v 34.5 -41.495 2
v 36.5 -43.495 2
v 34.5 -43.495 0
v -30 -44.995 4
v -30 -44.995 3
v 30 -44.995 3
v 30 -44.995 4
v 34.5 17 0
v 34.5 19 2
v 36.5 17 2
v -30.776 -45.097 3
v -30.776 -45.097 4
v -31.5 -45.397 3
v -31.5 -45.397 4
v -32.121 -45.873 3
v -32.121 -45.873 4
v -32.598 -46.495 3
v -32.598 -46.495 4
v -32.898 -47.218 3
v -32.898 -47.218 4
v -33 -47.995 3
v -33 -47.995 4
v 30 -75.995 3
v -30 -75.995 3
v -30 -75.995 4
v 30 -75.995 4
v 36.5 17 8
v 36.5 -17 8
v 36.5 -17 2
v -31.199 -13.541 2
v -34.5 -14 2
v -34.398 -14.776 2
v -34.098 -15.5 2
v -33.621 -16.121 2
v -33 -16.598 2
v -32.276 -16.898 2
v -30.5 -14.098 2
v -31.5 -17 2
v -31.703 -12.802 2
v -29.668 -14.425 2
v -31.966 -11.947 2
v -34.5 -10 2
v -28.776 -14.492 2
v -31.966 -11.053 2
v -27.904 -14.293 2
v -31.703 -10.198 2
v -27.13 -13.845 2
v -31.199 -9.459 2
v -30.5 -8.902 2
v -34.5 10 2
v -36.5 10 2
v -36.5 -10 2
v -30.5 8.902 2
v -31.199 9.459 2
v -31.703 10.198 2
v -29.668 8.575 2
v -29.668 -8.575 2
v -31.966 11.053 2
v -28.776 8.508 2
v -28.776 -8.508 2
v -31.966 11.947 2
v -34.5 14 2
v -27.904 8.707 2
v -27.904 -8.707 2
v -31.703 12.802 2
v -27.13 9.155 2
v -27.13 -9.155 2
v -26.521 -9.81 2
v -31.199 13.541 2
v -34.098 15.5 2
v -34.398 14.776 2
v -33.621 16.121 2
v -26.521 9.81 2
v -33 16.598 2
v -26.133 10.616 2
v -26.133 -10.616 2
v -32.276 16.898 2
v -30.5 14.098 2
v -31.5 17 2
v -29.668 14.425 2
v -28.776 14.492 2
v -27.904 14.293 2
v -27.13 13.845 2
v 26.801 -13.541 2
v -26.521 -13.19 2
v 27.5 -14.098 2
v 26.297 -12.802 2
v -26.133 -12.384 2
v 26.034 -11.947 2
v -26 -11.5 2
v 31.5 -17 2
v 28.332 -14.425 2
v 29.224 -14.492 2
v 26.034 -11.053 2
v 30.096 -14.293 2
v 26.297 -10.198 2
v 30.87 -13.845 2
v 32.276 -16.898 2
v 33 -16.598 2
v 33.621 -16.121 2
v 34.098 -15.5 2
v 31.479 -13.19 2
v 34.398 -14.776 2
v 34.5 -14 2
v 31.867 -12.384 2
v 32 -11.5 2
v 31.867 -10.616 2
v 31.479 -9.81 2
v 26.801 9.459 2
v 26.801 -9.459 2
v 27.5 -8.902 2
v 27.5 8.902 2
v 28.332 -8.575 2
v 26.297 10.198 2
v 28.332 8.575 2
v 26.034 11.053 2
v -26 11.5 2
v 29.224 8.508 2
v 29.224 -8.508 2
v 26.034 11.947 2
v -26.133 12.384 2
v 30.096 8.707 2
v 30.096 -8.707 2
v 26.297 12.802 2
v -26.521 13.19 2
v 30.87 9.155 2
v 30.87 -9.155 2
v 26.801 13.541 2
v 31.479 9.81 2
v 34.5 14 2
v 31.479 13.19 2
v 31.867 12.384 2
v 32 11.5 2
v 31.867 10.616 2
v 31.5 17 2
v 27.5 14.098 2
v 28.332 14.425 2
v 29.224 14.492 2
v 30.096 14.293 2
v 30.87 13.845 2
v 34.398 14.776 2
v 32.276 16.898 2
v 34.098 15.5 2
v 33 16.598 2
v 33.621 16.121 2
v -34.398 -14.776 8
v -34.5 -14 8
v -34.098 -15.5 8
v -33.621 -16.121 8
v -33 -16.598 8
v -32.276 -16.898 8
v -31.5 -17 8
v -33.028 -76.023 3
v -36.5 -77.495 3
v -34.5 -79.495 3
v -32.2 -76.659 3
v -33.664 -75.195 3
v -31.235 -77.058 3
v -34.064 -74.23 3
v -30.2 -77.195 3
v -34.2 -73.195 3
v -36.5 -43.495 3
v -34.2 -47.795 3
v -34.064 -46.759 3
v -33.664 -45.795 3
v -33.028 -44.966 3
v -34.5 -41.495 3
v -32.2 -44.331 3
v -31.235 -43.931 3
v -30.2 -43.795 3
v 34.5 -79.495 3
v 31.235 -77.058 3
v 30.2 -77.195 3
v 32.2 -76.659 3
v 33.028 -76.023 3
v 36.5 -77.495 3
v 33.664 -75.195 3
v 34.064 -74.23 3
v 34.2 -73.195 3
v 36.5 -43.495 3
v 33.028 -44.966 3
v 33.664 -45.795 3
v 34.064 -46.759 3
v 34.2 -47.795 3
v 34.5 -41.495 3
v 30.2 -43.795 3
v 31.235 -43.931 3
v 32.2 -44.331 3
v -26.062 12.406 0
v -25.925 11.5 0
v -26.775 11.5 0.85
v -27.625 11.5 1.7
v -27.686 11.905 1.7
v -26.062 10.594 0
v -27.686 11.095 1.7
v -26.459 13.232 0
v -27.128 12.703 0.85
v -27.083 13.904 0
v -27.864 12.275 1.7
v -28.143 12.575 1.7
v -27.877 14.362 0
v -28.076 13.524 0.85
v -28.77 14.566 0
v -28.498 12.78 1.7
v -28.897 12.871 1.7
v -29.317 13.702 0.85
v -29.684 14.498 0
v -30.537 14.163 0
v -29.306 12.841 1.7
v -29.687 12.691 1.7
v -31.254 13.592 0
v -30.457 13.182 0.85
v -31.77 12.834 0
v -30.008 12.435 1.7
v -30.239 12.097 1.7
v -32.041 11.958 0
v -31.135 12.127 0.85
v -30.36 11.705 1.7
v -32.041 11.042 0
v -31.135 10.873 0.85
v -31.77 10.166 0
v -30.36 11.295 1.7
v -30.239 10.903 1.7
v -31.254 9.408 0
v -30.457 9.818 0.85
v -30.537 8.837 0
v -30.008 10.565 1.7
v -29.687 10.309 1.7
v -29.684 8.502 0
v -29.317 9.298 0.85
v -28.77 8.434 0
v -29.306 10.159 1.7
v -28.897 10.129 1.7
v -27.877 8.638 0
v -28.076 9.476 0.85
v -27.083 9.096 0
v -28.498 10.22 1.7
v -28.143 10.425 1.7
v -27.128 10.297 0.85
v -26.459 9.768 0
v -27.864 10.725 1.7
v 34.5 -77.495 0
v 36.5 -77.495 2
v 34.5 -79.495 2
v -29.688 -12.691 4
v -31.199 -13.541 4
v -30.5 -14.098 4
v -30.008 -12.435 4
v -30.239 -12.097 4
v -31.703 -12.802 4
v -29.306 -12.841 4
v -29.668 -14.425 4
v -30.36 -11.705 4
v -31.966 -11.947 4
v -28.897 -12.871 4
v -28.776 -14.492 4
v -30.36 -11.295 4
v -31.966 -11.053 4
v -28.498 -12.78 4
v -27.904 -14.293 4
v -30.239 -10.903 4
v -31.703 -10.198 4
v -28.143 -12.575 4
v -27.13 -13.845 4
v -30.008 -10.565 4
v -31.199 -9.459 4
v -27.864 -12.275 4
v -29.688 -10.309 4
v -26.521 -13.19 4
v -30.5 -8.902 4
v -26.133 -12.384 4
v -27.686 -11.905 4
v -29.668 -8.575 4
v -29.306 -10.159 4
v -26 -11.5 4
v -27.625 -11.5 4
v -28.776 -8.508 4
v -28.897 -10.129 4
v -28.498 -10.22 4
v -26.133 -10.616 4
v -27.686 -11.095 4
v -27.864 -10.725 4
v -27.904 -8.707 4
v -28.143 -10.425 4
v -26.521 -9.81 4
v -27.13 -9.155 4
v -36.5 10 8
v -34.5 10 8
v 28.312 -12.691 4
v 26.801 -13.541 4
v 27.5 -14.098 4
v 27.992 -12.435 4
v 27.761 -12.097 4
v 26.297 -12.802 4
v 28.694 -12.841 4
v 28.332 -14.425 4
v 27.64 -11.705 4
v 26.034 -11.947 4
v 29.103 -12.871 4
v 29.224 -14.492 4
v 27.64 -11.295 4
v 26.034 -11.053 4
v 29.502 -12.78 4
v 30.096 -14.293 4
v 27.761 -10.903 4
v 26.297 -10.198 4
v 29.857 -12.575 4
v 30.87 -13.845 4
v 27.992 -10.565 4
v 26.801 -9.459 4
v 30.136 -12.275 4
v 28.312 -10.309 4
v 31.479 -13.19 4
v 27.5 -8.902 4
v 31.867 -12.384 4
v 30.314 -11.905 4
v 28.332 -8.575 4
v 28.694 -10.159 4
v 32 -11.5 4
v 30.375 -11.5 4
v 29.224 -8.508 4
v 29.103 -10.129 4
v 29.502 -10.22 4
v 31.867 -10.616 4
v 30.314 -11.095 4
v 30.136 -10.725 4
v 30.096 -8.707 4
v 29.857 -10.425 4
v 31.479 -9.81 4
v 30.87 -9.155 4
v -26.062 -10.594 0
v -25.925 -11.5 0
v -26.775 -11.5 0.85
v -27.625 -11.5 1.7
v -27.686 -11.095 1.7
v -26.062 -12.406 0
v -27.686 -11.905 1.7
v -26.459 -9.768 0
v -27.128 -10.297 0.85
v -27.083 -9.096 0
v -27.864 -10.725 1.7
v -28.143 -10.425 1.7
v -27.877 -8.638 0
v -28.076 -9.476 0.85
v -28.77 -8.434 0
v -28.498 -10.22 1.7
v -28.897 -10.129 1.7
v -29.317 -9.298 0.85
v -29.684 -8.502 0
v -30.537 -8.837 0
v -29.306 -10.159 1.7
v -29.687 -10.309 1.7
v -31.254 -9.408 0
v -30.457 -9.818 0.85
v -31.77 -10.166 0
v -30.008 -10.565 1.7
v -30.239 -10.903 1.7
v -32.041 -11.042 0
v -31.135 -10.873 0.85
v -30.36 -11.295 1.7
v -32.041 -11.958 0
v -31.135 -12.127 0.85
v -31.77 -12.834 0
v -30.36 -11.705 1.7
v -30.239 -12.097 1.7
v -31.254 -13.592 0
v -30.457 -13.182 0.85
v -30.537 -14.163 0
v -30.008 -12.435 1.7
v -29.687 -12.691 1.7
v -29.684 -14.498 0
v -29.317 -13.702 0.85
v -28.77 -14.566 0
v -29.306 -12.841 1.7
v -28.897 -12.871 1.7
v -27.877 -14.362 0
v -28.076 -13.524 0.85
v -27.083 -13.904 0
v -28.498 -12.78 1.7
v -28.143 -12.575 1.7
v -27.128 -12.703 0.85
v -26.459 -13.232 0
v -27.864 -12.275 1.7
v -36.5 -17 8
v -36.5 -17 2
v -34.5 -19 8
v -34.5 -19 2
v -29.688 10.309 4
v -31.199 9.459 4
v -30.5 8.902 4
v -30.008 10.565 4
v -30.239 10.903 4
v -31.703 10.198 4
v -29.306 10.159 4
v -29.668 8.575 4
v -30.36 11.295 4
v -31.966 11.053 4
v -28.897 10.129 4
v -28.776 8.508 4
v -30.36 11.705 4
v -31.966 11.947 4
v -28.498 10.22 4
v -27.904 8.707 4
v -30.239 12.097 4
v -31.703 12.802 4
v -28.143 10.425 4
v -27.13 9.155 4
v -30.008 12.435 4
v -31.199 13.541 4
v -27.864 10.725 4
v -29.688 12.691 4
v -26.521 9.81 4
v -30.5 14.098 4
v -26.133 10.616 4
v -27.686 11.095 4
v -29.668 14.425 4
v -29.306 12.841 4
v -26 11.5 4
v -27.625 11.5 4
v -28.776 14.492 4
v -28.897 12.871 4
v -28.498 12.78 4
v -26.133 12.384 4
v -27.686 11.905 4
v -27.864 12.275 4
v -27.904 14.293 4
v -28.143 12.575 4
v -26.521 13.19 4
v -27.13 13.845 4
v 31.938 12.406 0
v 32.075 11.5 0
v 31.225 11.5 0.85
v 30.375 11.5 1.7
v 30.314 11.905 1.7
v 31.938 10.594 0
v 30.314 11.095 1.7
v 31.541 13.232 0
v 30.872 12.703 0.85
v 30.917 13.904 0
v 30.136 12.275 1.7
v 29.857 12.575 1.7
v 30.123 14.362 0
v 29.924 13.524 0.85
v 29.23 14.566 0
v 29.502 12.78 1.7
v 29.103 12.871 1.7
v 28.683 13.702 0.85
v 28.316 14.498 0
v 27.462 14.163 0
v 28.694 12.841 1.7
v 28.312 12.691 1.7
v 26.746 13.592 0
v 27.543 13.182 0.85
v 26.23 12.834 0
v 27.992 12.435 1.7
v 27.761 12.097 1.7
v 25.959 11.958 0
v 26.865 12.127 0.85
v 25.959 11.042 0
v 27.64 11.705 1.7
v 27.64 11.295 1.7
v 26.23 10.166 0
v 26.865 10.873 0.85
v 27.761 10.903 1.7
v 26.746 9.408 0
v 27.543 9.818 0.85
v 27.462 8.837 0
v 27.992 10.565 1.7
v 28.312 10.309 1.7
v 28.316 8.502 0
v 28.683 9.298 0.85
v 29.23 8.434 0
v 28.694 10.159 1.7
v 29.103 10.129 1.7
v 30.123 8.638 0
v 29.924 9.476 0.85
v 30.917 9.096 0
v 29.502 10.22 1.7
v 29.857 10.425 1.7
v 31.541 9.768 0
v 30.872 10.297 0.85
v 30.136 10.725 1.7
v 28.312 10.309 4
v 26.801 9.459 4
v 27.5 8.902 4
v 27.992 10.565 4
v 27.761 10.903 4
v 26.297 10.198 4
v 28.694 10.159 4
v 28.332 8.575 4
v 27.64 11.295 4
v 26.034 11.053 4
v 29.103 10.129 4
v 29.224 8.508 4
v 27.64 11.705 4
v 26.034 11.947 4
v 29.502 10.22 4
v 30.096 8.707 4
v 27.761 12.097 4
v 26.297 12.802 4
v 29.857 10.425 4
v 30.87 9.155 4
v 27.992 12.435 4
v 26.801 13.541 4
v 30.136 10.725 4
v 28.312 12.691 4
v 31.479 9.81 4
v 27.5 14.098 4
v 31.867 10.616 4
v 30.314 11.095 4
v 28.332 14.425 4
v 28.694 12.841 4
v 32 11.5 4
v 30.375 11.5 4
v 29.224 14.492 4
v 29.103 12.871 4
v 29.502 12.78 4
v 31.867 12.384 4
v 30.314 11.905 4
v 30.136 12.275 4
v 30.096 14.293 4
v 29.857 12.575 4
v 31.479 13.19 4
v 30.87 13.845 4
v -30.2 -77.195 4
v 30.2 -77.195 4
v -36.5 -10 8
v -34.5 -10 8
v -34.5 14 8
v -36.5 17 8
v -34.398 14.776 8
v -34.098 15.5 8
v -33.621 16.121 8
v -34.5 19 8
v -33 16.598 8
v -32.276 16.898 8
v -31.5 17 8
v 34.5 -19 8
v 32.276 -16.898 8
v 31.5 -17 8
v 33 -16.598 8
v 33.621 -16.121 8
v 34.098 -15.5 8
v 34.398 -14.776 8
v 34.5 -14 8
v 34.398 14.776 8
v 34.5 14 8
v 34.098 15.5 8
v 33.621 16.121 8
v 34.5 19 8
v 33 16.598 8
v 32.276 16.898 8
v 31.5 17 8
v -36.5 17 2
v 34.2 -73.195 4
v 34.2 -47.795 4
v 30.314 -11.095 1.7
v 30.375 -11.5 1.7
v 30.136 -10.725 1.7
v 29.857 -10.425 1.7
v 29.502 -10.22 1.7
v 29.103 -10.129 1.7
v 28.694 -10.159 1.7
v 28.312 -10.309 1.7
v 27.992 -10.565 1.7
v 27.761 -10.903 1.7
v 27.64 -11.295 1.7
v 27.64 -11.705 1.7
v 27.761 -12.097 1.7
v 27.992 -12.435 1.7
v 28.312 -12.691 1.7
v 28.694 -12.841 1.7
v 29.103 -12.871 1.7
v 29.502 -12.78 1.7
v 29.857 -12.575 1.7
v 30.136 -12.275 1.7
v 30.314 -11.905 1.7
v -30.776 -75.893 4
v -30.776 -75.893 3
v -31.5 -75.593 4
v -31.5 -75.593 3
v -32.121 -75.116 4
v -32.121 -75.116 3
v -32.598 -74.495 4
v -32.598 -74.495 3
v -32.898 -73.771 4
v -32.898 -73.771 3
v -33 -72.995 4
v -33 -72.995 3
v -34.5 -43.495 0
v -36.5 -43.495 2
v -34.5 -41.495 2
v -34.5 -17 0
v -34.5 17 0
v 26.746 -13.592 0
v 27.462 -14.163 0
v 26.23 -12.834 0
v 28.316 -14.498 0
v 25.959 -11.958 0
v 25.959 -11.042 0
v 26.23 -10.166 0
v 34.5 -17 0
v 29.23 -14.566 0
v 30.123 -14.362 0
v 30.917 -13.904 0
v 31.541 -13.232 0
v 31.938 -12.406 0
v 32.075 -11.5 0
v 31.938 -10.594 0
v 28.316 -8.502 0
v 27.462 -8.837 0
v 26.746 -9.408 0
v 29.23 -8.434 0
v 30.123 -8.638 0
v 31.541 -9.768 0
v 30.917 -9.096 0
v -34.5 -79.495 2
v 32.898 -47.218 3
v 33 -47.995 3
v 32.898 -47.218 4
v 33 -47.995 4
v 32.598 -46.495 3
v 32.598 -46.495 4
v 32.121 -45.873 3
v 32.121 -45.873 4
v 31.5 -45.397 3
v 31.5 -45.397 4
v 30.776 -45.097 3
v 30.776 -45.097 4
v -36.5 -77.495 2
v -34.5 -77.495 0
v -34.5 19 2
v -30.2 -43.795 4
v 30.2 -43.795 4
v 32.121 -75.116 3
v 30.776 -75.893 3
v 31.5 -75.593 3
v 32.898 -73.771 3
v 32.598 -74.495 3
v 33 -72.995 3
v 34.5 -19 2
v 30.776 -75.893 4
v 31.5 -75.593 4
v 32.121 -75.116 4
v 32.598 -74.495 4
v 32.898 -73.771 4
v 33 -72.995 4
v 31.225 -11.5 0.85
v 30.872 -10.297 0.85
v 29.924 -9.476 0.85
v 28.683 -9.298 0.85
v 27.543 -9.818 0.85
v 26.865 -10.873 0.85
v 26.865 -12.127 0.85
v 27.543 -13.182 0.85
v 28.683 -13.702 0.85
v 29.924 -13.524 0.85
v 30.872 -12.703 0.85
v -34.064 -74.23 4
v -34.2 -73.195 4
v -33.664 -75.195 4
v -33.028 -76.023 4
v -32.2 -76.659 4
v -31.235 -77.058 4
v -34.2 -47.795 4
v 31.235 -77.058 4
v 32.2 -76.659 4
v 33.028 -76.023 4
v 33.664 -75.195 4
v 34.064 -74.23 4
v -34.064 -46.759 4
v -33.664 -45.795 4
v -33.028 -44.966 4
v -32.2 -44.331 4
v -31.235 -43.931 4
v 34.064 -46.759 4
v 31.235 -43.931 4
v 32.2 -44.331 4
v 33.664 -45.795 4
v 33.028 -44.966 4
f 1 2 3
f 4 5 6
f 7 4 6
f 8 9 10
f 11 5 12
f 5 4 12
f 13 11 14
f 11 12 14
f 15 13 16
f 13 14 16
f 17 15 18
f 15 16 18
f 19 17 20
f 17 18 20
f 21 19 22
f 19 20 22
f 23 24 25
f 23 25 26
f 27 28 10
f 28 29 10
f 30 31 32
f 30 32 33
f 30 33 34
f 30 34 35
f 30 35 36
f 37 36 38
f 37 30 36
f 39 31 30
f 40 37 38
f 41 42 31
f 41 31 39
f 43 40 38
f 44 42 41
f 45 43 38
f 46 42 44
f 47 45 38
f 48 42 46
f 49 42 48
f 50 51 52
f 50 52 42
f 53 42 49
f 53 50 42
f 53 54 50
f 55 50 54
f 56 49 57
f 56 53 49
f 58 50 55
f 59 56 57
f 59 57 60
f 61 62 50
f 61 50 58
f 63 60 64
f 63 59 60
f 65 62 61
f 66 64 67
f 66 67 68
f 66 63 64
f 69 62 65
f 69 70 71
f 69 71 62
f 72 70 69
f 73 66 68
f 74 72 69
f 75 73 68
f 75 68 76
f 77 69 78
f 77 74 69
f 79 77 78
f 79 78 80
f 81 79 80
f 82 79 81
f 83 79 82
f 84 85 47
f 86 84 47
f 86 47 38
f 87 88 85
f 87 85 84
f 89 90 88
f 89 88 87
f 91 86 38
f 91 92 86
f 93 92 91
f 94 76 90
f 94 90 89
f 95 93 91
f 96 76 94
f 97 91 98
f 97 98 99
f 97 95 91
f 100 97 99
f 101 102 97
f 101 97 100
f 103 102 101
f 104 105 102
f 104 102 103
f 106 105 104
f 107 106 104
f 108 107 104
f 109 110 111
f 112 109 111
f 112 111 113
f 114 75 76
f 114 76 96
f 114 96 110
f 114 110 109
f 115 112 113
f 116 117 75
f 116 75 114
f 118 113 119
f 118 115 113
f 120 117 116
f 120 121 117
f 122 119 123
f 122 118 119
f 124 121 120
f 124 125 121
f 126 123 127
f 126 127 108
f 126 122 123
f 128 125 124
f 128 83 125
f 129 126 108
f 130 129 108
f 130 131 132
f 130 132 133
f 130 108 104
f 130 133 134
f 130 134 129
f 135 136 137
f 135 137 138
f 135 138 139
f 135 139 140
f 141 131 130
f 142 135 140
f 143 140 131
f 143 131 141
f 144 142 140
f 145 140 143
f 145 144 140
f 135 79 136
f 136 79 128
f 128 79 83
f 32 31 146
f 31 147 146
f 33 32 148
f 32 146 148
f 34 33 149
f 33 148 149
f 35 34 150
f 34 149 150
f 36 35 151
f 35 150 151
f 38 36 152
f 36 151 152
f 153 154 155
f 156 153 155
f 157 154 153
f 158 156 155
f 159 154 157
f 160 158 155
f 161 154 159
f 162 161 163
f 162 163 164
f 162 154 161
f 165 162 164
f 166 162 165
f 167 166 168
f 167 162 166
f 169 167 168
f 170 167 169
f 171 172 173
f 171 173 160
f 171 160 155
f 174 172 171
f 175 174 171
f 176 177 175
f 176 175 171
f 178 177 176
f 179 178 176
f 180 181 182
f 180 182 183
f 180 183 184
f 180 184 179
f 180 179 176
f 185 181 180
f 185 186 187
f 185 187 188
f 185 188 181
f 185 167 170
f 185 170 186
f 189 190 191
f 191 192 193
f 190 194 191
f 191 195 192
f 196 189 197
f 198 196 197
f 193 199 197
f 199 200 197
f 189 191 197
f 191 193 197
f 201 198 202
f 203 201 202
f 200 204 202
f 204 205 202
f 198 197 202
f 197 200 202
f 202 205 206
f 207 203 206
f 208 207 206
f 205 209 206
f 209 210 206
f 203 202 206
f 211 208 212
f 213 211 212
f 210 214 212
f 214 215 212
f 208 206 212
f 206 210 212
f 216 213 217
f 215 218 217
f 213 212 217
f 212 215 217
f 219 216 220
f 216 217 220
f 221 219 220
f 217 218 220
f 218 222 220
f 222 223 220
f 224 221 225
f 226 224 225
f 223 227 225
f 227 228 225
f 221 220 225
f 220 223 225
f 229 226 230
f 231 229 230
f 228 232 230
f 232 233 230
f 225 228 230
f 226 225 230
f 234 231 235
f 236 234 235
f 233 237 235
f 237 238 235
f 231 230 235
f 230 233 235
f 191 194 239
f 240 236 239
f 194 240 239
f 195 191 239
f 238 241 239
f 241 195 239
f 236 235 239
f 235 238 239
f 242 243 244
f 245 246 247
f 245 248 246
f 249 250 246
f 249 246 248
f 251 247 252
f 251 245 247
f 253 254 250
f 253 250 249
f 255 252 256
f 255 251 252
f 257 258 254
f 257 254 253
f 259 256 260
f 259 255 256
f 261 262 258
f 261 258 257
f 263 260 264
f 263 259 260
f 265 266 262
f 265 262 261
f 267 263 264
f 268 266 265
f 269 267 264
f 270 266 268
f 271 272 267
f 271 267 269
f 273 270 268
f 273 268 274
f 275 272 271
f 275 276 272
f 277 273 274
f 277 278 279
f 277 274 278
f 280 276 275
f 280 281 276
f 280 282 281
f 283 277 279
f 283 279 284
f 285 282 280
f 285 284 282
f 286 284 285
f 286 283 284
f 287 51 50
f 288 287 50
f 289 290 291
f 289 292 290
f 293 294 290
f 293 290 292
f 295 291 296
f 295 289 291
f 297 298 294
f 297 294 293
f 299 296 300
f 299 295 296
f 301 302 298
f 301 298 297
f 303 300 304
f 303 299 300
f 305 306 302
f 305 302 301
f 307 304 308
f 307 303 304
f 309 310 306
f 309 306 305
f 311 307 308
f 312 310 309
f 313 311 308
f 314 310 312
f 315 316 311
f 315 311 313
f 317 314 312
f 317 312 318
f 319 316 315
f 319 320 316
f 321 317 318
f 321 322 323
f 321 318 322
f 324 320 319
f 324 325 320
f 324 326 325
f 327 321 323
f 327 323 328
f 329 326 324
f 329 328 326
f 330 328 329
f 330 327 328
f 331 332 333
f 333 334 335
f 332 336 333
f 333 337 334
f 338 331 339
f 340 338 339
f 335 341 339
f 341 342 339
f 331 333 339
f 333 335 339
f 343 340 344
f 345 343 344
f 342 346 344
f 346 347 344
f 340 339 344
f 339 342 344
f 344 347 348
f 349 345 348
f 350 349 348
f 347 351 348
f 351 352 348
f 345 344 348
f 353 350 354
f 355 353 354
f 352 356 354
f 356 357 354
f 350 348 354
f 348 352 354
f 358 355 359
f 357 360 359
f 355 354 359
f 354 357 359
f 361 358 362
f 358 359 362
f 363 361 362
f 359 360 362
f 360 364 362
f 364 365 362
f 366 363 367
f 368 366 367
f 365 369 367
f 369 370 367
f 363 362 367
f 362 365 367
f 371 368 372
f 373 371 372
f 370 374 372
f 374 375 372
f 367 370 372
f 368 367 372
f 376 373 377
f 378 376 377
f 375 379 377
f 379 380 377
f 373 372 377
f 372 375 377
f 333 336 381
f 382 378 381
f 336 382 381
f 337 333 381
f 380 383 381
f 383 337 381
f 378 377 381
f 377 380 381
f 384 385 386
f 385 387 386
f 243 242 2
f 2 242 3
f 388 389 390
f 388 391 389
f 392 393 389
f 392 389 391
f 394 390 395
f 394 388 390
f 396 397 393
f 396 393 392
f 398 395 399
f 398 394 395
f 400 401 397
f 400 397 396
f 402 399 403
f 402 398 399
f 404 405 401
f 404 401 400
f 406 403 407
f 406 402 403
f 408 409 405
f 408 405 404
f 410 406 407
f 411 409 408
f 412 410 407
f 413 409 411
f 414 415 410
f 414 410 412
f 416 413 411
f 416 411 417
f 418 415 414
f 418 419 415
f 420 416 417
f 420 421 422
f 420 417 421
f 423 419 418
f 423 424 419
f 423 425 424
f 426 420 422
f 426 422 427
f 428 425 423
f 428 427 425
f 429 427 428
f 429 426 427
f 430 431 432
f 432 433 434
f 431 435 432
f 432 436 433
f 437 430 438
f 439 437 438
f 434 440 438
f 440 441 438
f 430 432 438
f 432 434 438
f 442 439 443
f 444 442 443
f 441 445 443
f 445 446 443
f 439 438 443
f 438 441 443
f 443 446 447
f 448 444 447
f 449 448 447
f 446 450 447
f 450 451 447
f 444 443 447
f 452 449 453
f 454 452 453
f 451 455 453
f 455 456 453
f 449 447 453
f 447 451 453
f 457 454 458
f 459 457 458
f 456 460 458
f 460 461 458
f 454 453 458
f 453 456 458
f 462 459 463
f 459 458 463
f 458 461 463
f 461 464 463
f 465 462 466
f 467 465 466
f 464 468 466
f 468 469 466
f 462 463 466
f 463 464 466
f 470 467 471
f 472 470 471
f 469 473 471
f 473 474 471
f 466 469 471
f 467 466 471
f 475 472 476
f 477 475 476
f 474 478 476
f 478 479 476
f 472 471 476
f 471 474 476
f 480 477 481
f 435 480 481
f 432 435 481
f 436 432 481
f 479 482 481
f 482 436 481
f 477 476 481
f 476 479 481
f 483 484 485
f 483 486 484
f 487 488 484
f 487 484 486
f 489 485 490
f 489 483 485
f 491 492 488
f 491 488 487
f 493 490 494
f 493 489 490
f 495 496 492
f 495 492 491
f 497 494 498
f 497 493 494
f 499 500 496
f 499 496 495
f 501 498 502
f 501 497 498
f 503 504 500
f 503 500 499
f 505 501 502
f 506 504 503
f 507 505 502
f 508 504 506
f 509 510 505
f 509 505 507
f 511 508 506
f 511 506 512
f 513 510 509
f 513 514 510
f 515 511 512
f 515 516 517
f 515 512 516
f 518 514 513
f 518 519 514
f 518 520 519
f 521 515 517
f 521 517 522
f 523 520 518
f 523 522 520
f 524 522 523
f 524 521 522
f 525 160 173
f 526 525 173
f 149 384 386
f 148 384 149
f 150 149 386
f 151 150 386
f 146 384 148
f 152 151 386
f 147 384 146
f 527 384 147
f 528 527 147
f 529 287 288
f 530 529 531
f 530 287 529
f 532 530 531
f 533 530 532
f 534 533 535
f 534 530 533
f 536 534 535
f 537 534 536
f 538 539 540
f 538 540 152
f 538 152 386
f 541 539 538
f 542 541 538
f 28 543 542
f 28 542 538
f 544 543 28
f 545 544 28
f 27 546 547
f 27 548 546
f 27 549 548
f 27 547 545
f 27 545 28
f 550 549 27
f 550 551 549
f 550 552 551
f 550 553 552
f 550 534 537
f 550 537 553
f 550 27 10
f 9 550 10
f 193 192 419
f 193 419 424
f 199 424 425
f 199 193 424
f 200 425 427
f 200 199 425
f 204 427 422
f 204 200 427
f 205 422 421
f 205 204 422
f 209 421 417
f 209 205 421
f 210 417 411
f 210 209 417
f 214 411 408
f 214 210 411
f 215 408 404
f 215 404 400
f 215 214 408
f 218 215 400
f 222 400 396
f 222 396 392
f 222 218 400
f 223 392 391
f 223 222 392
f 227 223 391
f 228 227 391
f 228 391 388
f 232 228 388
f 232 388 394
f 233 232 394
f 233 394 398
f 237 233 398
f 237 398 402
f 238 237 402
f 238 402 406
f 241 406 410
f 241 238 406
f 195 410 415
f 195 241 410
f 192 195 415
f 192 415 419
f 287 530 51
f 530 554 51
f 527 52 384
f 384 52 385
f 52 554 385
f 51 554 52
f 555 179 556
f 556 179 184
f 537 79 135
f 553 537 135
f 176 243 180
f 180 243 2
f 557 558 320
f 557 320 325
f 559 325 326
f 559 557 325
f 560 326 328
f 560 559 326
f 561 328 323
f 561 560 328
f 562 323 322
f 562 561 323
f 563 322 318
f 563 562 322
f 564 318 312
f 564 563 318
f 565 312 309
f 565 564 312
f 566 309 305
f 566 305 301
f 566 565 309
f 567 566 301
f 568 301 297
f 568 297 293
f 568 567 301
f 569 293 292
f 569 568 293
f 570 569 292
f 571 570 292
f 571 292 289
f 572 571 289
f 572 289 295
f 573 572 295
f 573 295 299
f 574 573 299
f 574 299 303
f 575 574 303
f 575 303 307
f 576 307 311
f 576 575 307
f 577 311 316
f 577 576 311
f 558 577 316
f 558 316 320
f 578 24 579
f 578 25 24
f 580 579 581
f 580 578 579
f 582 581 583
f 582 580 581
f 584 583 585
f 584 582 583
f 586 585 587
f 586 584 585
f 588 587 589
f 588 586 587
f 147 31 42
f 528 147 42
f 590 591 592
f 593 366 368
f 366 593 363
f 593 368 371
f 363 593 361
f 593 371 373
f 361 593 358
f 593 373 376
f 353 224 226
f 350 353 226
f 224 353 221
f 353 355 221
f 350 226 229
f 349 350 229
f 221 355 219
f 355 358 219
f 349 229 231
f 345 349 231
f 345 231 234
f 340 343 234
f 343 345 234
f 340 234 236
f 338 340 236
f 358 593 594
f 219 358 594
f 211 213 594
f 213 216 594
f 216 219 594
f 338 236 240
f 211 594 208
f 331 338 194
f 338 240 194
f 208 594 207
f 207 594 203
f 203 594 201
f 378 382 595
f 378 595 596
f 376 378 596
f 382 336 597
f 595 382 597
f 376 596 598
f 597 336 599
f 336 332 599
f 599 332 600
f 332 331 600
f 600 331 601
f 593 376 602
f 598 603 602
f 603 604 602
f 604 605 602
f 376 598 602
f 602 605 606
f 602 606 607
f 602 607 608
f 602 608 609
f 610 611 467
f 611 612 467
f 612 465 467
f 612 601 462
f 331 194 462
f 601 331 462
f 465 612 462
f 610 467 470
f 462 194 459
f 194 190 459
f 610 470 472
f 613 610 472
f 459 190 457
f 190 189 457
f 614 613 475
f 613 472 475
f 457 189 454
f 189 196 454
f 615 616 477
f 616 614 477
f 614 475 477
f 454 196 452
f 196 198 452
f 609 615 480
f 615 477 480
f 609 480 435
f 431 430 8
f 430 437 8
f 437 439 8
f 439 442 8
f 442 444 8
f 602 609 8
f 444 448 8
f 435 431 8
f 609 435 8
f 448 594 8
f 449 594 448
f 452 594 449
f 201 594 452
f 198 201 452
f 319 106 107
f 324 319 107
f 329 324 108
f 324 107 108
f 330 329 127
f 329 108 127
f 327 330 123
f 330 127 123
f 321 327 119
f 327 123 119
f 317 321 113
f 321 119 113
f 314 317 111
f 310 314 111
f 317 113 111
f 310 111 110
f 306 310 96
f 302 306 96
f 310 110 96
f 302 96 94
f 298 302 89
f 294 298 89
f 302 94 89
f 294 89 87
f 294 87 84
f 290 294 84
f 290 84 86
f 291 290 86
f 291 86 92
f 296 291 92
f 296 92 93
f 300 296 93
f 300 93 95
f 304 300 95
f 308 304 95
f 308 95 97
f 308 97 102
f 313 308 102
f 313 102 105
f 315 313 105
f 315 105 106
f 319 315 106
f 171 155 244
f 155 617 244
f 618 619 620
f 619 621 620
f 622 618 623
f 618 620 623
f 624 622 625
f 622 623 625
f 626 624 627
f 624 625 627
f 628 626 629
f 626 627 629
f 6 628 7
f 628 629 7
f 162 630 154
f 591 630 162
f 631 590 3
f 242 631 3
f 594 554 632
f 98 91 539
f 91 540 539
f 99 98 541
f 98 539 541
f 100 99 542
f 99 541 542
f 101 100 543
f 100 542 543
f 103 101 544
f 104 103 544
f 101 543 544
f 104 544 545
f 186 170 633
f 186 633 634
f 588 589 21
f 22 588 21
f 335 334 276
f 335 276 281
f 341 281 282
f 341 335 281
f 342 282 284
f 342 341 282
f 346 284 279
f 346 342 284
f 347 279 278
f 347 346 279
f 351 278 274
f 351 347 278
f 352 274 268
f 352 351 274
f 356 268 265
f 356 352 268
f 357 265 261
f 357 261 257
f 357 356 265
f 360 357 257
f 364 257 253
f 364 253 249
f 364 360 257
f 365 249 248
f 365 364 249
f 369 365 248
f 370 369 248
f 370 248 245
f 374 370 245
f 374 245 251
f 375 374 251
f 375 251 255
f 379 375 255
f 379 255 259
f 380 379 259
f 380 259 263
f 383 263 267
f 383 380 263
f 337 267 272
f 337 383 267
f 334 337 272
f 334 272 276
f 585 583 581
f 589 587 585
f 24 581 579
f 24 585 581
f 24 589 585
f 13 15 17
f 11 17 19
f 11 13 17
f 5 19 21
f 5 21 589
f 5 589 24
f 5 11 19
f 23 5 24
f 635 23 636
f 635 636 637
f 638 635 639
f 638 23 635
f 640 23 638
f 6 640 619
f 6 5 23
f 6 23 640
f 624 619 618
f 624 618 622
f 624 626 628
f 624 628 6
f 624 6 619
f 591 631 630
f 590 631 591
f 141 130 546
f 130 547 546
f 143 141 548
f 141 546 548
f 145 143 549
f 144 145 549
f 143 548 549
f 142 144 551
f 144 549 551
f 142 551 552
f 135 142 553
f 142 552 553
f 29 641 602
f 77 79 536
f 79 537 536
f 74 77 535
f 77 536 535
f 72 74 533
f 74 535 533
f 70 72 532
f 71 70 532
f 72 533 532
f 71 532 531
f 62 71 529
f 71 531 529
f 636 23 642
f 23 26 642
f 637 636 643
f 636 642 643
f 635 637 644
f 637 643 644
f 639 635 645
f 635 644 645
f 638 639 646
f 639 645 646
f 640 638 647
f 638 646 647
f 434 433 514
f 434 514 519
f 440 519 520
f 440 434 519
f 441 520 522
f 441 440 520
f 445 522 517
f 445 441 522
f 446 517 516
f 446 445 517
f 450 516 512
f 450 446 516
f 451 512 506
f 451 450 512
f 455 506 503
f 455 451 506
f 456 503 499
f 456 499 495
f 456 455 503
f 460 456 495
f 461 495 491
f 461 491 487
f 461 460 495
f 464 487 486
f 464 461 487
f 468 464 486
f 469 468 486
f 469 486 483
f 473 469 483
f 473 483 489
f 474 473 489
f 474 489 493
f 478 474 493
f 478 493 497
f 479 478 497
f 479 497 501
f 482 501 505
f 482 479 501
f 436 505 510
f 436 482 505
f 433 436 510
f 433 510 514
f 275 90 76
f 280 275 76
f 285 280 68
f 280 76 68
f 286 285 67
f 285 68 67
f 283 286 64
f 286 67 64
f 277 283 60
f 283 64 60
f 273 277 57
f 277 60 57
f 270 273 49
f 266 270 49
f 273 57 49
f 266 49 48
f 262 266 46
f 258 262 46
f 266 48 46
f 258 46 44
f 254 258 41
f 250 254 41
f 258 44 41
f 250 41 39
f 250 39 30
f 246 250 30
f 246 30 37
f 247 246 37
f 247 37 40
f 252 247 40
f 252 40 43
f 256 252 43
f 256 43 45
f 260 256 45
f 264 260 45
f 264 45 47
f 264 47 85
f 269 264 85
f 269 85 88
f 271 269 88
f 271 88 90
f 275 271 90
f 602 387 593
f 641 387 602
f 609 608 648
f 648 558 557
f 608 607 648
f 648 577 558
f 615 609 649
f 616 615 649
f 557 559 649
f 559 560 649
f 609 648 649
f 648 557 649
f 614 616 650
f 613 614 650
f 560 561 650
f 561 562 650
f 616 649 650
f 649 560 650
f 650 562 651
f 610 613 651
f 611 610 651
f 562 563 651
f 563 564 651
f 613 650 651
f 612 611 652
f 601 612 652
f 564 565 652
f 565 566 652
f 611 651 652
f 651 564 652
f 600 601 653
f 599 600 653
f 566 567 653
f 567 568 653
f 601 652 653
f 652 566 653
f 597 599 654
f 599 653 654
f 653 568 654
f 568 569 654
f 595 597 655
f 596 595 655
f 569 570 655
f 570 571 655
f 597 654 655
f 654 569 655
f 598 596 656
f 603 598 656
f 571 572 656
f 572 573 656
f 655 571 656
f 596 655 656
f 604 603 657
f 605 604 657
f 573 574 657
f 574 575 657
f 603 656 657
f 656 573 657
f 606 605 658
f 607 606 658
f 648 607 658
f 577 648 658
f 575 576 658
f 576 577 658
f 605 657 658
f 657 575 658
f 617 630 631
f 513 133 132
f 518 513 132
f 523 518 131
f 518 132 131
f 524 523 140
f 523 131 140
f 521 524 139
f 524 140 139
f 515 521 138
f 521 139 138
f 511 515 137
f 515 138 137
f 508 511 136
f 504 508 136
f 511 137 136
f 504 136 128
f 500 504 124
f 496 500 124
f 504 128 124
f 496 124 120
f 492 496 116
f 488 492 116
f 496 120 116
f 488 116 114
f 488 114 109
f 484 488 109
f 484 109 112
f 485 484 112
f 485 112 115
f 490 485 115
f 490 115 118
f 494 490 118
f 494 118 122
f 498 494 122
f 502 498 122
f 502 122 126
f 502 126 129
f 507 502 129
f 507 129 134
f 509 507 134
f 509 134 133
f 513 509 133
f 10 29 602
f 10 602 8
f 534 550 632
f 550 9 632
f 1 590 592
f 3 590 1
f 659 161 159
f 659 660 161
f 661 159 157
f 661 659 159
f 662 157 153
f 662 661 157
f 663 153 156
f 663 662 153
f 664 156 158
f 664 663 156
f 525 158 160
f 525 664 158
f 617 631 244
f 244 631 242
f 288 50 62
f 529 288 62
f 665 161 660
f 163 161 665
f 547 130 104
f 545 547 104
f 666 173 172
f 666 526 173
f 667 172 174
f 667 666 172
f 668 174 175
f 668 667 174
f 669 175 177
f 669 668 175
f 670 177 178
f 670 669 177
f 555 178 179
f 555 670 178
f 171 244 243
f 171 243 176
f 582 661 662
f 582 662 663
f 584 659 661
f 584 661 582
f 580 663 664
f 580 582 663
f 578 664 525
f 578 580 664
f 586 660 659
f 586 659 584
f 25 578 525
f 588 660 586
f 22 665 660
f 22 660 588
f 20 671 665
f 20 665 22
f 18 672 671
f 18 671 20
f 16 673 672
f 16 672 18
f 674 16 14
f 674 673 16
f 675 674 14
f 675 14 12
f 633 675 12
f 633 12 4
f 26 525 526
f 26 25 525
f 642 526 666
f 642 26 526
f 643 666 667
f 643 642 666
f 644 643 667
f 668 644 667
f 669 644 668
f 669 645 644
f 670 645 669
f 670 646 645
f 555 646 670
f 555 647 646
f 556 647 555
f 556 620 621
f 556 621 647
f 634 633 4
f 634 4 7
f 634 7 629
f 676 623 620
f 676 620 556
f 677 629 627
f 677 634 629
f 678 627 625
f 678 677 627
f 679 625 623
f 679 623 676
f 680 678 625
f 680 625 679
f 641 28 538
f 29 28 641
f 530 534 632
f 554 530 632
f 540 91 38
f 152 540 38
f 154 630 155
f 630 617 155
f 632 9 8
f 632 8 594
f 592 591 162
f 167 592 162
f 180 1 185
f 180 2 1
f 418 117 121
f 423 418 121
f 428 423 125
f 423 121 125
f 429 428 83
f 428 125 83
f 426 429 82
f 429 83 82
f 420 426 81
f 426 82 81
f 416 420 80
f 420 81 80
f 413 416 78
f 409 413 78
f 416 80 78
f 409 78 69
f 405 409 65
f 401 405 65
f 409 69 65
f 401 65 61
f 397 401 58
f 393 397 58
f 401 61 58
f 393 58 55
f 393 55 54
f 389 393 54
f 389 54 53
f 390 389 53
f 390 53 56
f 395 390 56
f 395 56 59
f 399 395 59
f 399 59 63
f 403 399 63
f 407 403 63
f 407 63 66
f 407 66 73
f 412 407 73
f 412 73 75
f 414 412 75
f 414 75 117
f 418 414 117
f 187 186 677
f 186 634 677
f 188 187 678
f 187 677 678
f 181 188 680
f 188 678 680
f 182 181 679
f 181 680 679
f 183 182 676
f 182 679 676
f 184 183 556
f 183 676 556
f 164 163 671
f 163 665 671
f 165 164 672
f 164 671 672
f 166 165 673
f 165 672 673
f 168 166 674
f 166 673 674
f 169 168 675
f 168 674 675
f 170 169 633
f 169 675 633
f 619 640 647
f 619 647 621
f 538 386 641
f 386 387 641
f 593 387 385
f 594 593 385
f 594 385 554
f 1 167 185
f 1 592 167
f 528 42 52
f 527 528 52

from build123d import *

# Parameters (mm, degrees)
F0_W     = 65
F0_H     = 30
F0_R     = 3
F0_R_2   = 1.375
F0_W_2   = 2
F0_H_2   = 20
F1_DEPTH = 2
F2_DEPTH = 4
F3_DEPTH = 8
F4_R     = 3
F5_SIZE  = 1.99999
F6_SIZE  = 1.7
F7_W     = 73
F7_H     = 38
F7_W_2   = 68.4
F7_H_2   = 33.4
F7_W_3   = 66
F7_H_3   = 31
F7_W_4   = 65
F7_H_4   = 30
F8_DEPTH = 3
F9_DEPTH = 4
F10_R    = 3
F11_R    = 4
F12_SIZE = 2


# Not quite as in the source:
# - a fillet or chamfer is up to 0.001 mm smaller than in the source, because OpenCascade refuses the exact size


with BuildPart() as f1:
    # F0 (on Top) → F1 (new body)
    with BuildSketch(Plane.XY):
        Polygon((-34.5, 10), (-34.5, 17), (34.5, 17), (34.5, -17), (-34.5, -17), (-34.5, -10), (-36.5, -10), (-36.5, -19), (36.5, -19), (36.5, 19), (-36.5, 19), (-36.5, 10), align=None)
        Polygon((34.5, 17), (-34.5, 17), (-34.5, 10), (-34.5, -10), (-34.5, -17), (34.5, -17), align=None)
        Rectangle(F0_W, F0_H, mode=Mode.SUBTRACT)
        Rectangle(F0_W, F0_H)
        with Locations((-29, -11.5)):
            Circle(F0_R, mode=Mode.SUBTRACT)
        with Locations((29, -11.5)):
            Circle(F0_R, mode=Mode.SUBTRACT)
        with Locations((-29, 11.5)):
            Circle(F0_R, mode=Mode.SUBTRACT)
        with Locations((29, 11.5)):
            Circle(F0_R, mode=Mode.SUBTRACT)
        with Locations((-29, 11.5)):
            Circle(F0_R)
        with Locations((-29, 11.5)):
            Circle(F0_R_2, mode=Mode.SUBTRACT)
        with Locations((29, 11.5)):
            Circle(F0_R)
        with Locations((29, 11.5)):
            Circle(F0_R_2, mode=Mode.SUBTRACT)
        with Locations((29, -11.5)):
            Circle(F0_R)
        with Locations((29, -11.5)):
            Circle(F0_R_2, mode=Mode.SUBTRACT)
        with Locations((-29, -11.5)):
            Circle(F0_R)
        with Locations((-29, -11.5)):
            Circle(F0_R_2, mode=Mode.SUBTRACT)
        with Locations((-35.5, 0)):
            Rectangle(F0_W_2, F0_H_2)
    extrude(amount=F1_DEPTH)

    # F0 (on Top) → F2 (join)
    with BuildSketch(Plane.XY):
        with Locations((-29, -11.5)):
            Circle(F0_R)
        with Locations((-29, -11.5)):
            Circle(F0_R_2, mode=Mode.SUBTRACT)
        with Locations((-29, 11.5)):
            Circle(F0_R)
        with Locations((-29, 11.5)):
            Circle(F0_R_2, mode=Mode.SUBTRACT)
        with Locations((29, -11.5)):
            Circle(F0_R)
        with Locations((29, -11.5)):
            Circle(F0_R_2, mode=Mode.SUBTRACT)
        with Locations((29, 11.5)):
            Circle(F0_R)
        with Locations((29, 11.5)):
            Circle(F0_R_2, mode=Mode.SUBTRACT)
    extrude(amount=F2_DEPTH)

    # F0 (on Top) → F3 (join)
    with BuildSketch(Plane.XY):
        Polygon((-34.5, 10), (-34.5, 17), (34.5, 17), (34.5, -17), (-34.5, -17), (-34.5, -10), (-36.5, -10), (-36.5, -19), (36.5, -19), (36.5, 19), (-36.5, 19), (-36.5, 10), align=None)
    extrude(amount=F3_DEPTH)

    # F4
    f4_edges = [f1.edges().sort_by_distance(p)[0] for p in [
        (-34.5, 17, 5),
        (-34.5, -17, 5),
        (34.5, -17, 5),
        (34.5, 17, 5),
    ]]
    fillet(f4_edges, radius=F4_R)

    # F5 (size 2 in the source; OpenCascade refuses exactly that, so slightly less here)
    f5_edges = [f1.edges().sort_by_distance(p)[0] for p in [
        (36.5, -19, 4),
        (36.5, 19, 4),
        (-36.5, 19, 4),
        (-36.5, -19, 4),
        (0, -19, 0),
        (-36.5, 0, 0),
        (0, 19, 0),
        (36.5, 0, 0),
    ]]
    chamfer(f5_edges, length=F5_SIZE)

    # F6
    f6_edges = [f1.edges().sort_by_distance(p)[0] for p in [
        (27.625, 11.5, 0),
        (27.625, -11.5, 0),
        (-30.375, -11.5, 0),
        (-30.375, 11.5, 0),
    ]]
    chamfer(f6_edges, length=F6_SIZE)


with BuildPart() as f8:
    # F7 (on Top) → F8 (new body)
    with BuildSketch(Plane.XY):
        with Locations((0, -60.494761914)):
            Rectangle(F7_W, F7_H)
        with Locations((0, -60.494761914)):
            Rectangle(F7_W_2, F7_H_2, mode=Mode.SUBTRACT)
        with Locations((0, -60.494761914)):
            Rectangle(F7_W_2, F7_H_2)
        with Locations((0, -60.494761914)):
            Rectangle(F7_W_3, F7_H_3, mode=Mode.SUBTRACT)
        with Locations((0, -60.494761914)):
            Rectangle(F7_W_3, F7_H_3)
        with Locations((0, -60.494761914)):
            Rectangle(F7_W_4, F7_H_4, mode=Mode.SUBTRACT)
        with Locations((0, -60.494761914)):
            Rectangle(F7_W_4, F7_H_4)
    extrude(amount=F8_DEPTH)

    # F7 (on Top) → F9 (join)
    with BuildSketch(Plane.XY):
        with Locations((0, -60.494761914)):
            Rectangle(F7_W_2, F7_H_2)
        with Locations((0, -60.494761914)):
            Rectangle(F7_W_3, F7_H_3, mode=Mode.SUBTRACT)
    extrude(amount=F9_DEPTH)

    # F10
    f10_edges = [f8.edges().sort_by_distance(p)[0] for p in [
        (33, -44.994762, 3.5),
        (-33, -44.994762, 3.5),
        (-33, -75.994762, 3.5),
        (33, -75.994762, 3.5),
    ]]
    fillet(f10_edges, radius=F10_R)

    # F11
    f11_edges = [f8.edges().sort_by_distance(p)[0] for p in [
        (-34.2, -43.794762, 3.5),
        (-34.2, -77.194762, 3.5),
        (34.2, -77.194762, 3.5),
        (34.2, -43.794762, 3.5),
    ]]
    fillet(f11_edges, radius=F11_R)

    # F12
    f12_edges = [f8.edges().sort_by_distance(p)[0] for p in [
        (36.5, -79.494762, 1.5),
        (36.5, -41.494762, 1.5),
        (-36.5, -41.494762, 1.5),
        (-36.5, -79.494762, 1.5),
        (-36.5, -60.494762, 0),
        (36.5, -60.494762, 0),
        (0, -41.494762, 0),
        (0, -79.494762, 0),
    ]]
    chamfer(f12_edges, length=F12_SIZE)


solid = Compound([f1.part, f8.part])
